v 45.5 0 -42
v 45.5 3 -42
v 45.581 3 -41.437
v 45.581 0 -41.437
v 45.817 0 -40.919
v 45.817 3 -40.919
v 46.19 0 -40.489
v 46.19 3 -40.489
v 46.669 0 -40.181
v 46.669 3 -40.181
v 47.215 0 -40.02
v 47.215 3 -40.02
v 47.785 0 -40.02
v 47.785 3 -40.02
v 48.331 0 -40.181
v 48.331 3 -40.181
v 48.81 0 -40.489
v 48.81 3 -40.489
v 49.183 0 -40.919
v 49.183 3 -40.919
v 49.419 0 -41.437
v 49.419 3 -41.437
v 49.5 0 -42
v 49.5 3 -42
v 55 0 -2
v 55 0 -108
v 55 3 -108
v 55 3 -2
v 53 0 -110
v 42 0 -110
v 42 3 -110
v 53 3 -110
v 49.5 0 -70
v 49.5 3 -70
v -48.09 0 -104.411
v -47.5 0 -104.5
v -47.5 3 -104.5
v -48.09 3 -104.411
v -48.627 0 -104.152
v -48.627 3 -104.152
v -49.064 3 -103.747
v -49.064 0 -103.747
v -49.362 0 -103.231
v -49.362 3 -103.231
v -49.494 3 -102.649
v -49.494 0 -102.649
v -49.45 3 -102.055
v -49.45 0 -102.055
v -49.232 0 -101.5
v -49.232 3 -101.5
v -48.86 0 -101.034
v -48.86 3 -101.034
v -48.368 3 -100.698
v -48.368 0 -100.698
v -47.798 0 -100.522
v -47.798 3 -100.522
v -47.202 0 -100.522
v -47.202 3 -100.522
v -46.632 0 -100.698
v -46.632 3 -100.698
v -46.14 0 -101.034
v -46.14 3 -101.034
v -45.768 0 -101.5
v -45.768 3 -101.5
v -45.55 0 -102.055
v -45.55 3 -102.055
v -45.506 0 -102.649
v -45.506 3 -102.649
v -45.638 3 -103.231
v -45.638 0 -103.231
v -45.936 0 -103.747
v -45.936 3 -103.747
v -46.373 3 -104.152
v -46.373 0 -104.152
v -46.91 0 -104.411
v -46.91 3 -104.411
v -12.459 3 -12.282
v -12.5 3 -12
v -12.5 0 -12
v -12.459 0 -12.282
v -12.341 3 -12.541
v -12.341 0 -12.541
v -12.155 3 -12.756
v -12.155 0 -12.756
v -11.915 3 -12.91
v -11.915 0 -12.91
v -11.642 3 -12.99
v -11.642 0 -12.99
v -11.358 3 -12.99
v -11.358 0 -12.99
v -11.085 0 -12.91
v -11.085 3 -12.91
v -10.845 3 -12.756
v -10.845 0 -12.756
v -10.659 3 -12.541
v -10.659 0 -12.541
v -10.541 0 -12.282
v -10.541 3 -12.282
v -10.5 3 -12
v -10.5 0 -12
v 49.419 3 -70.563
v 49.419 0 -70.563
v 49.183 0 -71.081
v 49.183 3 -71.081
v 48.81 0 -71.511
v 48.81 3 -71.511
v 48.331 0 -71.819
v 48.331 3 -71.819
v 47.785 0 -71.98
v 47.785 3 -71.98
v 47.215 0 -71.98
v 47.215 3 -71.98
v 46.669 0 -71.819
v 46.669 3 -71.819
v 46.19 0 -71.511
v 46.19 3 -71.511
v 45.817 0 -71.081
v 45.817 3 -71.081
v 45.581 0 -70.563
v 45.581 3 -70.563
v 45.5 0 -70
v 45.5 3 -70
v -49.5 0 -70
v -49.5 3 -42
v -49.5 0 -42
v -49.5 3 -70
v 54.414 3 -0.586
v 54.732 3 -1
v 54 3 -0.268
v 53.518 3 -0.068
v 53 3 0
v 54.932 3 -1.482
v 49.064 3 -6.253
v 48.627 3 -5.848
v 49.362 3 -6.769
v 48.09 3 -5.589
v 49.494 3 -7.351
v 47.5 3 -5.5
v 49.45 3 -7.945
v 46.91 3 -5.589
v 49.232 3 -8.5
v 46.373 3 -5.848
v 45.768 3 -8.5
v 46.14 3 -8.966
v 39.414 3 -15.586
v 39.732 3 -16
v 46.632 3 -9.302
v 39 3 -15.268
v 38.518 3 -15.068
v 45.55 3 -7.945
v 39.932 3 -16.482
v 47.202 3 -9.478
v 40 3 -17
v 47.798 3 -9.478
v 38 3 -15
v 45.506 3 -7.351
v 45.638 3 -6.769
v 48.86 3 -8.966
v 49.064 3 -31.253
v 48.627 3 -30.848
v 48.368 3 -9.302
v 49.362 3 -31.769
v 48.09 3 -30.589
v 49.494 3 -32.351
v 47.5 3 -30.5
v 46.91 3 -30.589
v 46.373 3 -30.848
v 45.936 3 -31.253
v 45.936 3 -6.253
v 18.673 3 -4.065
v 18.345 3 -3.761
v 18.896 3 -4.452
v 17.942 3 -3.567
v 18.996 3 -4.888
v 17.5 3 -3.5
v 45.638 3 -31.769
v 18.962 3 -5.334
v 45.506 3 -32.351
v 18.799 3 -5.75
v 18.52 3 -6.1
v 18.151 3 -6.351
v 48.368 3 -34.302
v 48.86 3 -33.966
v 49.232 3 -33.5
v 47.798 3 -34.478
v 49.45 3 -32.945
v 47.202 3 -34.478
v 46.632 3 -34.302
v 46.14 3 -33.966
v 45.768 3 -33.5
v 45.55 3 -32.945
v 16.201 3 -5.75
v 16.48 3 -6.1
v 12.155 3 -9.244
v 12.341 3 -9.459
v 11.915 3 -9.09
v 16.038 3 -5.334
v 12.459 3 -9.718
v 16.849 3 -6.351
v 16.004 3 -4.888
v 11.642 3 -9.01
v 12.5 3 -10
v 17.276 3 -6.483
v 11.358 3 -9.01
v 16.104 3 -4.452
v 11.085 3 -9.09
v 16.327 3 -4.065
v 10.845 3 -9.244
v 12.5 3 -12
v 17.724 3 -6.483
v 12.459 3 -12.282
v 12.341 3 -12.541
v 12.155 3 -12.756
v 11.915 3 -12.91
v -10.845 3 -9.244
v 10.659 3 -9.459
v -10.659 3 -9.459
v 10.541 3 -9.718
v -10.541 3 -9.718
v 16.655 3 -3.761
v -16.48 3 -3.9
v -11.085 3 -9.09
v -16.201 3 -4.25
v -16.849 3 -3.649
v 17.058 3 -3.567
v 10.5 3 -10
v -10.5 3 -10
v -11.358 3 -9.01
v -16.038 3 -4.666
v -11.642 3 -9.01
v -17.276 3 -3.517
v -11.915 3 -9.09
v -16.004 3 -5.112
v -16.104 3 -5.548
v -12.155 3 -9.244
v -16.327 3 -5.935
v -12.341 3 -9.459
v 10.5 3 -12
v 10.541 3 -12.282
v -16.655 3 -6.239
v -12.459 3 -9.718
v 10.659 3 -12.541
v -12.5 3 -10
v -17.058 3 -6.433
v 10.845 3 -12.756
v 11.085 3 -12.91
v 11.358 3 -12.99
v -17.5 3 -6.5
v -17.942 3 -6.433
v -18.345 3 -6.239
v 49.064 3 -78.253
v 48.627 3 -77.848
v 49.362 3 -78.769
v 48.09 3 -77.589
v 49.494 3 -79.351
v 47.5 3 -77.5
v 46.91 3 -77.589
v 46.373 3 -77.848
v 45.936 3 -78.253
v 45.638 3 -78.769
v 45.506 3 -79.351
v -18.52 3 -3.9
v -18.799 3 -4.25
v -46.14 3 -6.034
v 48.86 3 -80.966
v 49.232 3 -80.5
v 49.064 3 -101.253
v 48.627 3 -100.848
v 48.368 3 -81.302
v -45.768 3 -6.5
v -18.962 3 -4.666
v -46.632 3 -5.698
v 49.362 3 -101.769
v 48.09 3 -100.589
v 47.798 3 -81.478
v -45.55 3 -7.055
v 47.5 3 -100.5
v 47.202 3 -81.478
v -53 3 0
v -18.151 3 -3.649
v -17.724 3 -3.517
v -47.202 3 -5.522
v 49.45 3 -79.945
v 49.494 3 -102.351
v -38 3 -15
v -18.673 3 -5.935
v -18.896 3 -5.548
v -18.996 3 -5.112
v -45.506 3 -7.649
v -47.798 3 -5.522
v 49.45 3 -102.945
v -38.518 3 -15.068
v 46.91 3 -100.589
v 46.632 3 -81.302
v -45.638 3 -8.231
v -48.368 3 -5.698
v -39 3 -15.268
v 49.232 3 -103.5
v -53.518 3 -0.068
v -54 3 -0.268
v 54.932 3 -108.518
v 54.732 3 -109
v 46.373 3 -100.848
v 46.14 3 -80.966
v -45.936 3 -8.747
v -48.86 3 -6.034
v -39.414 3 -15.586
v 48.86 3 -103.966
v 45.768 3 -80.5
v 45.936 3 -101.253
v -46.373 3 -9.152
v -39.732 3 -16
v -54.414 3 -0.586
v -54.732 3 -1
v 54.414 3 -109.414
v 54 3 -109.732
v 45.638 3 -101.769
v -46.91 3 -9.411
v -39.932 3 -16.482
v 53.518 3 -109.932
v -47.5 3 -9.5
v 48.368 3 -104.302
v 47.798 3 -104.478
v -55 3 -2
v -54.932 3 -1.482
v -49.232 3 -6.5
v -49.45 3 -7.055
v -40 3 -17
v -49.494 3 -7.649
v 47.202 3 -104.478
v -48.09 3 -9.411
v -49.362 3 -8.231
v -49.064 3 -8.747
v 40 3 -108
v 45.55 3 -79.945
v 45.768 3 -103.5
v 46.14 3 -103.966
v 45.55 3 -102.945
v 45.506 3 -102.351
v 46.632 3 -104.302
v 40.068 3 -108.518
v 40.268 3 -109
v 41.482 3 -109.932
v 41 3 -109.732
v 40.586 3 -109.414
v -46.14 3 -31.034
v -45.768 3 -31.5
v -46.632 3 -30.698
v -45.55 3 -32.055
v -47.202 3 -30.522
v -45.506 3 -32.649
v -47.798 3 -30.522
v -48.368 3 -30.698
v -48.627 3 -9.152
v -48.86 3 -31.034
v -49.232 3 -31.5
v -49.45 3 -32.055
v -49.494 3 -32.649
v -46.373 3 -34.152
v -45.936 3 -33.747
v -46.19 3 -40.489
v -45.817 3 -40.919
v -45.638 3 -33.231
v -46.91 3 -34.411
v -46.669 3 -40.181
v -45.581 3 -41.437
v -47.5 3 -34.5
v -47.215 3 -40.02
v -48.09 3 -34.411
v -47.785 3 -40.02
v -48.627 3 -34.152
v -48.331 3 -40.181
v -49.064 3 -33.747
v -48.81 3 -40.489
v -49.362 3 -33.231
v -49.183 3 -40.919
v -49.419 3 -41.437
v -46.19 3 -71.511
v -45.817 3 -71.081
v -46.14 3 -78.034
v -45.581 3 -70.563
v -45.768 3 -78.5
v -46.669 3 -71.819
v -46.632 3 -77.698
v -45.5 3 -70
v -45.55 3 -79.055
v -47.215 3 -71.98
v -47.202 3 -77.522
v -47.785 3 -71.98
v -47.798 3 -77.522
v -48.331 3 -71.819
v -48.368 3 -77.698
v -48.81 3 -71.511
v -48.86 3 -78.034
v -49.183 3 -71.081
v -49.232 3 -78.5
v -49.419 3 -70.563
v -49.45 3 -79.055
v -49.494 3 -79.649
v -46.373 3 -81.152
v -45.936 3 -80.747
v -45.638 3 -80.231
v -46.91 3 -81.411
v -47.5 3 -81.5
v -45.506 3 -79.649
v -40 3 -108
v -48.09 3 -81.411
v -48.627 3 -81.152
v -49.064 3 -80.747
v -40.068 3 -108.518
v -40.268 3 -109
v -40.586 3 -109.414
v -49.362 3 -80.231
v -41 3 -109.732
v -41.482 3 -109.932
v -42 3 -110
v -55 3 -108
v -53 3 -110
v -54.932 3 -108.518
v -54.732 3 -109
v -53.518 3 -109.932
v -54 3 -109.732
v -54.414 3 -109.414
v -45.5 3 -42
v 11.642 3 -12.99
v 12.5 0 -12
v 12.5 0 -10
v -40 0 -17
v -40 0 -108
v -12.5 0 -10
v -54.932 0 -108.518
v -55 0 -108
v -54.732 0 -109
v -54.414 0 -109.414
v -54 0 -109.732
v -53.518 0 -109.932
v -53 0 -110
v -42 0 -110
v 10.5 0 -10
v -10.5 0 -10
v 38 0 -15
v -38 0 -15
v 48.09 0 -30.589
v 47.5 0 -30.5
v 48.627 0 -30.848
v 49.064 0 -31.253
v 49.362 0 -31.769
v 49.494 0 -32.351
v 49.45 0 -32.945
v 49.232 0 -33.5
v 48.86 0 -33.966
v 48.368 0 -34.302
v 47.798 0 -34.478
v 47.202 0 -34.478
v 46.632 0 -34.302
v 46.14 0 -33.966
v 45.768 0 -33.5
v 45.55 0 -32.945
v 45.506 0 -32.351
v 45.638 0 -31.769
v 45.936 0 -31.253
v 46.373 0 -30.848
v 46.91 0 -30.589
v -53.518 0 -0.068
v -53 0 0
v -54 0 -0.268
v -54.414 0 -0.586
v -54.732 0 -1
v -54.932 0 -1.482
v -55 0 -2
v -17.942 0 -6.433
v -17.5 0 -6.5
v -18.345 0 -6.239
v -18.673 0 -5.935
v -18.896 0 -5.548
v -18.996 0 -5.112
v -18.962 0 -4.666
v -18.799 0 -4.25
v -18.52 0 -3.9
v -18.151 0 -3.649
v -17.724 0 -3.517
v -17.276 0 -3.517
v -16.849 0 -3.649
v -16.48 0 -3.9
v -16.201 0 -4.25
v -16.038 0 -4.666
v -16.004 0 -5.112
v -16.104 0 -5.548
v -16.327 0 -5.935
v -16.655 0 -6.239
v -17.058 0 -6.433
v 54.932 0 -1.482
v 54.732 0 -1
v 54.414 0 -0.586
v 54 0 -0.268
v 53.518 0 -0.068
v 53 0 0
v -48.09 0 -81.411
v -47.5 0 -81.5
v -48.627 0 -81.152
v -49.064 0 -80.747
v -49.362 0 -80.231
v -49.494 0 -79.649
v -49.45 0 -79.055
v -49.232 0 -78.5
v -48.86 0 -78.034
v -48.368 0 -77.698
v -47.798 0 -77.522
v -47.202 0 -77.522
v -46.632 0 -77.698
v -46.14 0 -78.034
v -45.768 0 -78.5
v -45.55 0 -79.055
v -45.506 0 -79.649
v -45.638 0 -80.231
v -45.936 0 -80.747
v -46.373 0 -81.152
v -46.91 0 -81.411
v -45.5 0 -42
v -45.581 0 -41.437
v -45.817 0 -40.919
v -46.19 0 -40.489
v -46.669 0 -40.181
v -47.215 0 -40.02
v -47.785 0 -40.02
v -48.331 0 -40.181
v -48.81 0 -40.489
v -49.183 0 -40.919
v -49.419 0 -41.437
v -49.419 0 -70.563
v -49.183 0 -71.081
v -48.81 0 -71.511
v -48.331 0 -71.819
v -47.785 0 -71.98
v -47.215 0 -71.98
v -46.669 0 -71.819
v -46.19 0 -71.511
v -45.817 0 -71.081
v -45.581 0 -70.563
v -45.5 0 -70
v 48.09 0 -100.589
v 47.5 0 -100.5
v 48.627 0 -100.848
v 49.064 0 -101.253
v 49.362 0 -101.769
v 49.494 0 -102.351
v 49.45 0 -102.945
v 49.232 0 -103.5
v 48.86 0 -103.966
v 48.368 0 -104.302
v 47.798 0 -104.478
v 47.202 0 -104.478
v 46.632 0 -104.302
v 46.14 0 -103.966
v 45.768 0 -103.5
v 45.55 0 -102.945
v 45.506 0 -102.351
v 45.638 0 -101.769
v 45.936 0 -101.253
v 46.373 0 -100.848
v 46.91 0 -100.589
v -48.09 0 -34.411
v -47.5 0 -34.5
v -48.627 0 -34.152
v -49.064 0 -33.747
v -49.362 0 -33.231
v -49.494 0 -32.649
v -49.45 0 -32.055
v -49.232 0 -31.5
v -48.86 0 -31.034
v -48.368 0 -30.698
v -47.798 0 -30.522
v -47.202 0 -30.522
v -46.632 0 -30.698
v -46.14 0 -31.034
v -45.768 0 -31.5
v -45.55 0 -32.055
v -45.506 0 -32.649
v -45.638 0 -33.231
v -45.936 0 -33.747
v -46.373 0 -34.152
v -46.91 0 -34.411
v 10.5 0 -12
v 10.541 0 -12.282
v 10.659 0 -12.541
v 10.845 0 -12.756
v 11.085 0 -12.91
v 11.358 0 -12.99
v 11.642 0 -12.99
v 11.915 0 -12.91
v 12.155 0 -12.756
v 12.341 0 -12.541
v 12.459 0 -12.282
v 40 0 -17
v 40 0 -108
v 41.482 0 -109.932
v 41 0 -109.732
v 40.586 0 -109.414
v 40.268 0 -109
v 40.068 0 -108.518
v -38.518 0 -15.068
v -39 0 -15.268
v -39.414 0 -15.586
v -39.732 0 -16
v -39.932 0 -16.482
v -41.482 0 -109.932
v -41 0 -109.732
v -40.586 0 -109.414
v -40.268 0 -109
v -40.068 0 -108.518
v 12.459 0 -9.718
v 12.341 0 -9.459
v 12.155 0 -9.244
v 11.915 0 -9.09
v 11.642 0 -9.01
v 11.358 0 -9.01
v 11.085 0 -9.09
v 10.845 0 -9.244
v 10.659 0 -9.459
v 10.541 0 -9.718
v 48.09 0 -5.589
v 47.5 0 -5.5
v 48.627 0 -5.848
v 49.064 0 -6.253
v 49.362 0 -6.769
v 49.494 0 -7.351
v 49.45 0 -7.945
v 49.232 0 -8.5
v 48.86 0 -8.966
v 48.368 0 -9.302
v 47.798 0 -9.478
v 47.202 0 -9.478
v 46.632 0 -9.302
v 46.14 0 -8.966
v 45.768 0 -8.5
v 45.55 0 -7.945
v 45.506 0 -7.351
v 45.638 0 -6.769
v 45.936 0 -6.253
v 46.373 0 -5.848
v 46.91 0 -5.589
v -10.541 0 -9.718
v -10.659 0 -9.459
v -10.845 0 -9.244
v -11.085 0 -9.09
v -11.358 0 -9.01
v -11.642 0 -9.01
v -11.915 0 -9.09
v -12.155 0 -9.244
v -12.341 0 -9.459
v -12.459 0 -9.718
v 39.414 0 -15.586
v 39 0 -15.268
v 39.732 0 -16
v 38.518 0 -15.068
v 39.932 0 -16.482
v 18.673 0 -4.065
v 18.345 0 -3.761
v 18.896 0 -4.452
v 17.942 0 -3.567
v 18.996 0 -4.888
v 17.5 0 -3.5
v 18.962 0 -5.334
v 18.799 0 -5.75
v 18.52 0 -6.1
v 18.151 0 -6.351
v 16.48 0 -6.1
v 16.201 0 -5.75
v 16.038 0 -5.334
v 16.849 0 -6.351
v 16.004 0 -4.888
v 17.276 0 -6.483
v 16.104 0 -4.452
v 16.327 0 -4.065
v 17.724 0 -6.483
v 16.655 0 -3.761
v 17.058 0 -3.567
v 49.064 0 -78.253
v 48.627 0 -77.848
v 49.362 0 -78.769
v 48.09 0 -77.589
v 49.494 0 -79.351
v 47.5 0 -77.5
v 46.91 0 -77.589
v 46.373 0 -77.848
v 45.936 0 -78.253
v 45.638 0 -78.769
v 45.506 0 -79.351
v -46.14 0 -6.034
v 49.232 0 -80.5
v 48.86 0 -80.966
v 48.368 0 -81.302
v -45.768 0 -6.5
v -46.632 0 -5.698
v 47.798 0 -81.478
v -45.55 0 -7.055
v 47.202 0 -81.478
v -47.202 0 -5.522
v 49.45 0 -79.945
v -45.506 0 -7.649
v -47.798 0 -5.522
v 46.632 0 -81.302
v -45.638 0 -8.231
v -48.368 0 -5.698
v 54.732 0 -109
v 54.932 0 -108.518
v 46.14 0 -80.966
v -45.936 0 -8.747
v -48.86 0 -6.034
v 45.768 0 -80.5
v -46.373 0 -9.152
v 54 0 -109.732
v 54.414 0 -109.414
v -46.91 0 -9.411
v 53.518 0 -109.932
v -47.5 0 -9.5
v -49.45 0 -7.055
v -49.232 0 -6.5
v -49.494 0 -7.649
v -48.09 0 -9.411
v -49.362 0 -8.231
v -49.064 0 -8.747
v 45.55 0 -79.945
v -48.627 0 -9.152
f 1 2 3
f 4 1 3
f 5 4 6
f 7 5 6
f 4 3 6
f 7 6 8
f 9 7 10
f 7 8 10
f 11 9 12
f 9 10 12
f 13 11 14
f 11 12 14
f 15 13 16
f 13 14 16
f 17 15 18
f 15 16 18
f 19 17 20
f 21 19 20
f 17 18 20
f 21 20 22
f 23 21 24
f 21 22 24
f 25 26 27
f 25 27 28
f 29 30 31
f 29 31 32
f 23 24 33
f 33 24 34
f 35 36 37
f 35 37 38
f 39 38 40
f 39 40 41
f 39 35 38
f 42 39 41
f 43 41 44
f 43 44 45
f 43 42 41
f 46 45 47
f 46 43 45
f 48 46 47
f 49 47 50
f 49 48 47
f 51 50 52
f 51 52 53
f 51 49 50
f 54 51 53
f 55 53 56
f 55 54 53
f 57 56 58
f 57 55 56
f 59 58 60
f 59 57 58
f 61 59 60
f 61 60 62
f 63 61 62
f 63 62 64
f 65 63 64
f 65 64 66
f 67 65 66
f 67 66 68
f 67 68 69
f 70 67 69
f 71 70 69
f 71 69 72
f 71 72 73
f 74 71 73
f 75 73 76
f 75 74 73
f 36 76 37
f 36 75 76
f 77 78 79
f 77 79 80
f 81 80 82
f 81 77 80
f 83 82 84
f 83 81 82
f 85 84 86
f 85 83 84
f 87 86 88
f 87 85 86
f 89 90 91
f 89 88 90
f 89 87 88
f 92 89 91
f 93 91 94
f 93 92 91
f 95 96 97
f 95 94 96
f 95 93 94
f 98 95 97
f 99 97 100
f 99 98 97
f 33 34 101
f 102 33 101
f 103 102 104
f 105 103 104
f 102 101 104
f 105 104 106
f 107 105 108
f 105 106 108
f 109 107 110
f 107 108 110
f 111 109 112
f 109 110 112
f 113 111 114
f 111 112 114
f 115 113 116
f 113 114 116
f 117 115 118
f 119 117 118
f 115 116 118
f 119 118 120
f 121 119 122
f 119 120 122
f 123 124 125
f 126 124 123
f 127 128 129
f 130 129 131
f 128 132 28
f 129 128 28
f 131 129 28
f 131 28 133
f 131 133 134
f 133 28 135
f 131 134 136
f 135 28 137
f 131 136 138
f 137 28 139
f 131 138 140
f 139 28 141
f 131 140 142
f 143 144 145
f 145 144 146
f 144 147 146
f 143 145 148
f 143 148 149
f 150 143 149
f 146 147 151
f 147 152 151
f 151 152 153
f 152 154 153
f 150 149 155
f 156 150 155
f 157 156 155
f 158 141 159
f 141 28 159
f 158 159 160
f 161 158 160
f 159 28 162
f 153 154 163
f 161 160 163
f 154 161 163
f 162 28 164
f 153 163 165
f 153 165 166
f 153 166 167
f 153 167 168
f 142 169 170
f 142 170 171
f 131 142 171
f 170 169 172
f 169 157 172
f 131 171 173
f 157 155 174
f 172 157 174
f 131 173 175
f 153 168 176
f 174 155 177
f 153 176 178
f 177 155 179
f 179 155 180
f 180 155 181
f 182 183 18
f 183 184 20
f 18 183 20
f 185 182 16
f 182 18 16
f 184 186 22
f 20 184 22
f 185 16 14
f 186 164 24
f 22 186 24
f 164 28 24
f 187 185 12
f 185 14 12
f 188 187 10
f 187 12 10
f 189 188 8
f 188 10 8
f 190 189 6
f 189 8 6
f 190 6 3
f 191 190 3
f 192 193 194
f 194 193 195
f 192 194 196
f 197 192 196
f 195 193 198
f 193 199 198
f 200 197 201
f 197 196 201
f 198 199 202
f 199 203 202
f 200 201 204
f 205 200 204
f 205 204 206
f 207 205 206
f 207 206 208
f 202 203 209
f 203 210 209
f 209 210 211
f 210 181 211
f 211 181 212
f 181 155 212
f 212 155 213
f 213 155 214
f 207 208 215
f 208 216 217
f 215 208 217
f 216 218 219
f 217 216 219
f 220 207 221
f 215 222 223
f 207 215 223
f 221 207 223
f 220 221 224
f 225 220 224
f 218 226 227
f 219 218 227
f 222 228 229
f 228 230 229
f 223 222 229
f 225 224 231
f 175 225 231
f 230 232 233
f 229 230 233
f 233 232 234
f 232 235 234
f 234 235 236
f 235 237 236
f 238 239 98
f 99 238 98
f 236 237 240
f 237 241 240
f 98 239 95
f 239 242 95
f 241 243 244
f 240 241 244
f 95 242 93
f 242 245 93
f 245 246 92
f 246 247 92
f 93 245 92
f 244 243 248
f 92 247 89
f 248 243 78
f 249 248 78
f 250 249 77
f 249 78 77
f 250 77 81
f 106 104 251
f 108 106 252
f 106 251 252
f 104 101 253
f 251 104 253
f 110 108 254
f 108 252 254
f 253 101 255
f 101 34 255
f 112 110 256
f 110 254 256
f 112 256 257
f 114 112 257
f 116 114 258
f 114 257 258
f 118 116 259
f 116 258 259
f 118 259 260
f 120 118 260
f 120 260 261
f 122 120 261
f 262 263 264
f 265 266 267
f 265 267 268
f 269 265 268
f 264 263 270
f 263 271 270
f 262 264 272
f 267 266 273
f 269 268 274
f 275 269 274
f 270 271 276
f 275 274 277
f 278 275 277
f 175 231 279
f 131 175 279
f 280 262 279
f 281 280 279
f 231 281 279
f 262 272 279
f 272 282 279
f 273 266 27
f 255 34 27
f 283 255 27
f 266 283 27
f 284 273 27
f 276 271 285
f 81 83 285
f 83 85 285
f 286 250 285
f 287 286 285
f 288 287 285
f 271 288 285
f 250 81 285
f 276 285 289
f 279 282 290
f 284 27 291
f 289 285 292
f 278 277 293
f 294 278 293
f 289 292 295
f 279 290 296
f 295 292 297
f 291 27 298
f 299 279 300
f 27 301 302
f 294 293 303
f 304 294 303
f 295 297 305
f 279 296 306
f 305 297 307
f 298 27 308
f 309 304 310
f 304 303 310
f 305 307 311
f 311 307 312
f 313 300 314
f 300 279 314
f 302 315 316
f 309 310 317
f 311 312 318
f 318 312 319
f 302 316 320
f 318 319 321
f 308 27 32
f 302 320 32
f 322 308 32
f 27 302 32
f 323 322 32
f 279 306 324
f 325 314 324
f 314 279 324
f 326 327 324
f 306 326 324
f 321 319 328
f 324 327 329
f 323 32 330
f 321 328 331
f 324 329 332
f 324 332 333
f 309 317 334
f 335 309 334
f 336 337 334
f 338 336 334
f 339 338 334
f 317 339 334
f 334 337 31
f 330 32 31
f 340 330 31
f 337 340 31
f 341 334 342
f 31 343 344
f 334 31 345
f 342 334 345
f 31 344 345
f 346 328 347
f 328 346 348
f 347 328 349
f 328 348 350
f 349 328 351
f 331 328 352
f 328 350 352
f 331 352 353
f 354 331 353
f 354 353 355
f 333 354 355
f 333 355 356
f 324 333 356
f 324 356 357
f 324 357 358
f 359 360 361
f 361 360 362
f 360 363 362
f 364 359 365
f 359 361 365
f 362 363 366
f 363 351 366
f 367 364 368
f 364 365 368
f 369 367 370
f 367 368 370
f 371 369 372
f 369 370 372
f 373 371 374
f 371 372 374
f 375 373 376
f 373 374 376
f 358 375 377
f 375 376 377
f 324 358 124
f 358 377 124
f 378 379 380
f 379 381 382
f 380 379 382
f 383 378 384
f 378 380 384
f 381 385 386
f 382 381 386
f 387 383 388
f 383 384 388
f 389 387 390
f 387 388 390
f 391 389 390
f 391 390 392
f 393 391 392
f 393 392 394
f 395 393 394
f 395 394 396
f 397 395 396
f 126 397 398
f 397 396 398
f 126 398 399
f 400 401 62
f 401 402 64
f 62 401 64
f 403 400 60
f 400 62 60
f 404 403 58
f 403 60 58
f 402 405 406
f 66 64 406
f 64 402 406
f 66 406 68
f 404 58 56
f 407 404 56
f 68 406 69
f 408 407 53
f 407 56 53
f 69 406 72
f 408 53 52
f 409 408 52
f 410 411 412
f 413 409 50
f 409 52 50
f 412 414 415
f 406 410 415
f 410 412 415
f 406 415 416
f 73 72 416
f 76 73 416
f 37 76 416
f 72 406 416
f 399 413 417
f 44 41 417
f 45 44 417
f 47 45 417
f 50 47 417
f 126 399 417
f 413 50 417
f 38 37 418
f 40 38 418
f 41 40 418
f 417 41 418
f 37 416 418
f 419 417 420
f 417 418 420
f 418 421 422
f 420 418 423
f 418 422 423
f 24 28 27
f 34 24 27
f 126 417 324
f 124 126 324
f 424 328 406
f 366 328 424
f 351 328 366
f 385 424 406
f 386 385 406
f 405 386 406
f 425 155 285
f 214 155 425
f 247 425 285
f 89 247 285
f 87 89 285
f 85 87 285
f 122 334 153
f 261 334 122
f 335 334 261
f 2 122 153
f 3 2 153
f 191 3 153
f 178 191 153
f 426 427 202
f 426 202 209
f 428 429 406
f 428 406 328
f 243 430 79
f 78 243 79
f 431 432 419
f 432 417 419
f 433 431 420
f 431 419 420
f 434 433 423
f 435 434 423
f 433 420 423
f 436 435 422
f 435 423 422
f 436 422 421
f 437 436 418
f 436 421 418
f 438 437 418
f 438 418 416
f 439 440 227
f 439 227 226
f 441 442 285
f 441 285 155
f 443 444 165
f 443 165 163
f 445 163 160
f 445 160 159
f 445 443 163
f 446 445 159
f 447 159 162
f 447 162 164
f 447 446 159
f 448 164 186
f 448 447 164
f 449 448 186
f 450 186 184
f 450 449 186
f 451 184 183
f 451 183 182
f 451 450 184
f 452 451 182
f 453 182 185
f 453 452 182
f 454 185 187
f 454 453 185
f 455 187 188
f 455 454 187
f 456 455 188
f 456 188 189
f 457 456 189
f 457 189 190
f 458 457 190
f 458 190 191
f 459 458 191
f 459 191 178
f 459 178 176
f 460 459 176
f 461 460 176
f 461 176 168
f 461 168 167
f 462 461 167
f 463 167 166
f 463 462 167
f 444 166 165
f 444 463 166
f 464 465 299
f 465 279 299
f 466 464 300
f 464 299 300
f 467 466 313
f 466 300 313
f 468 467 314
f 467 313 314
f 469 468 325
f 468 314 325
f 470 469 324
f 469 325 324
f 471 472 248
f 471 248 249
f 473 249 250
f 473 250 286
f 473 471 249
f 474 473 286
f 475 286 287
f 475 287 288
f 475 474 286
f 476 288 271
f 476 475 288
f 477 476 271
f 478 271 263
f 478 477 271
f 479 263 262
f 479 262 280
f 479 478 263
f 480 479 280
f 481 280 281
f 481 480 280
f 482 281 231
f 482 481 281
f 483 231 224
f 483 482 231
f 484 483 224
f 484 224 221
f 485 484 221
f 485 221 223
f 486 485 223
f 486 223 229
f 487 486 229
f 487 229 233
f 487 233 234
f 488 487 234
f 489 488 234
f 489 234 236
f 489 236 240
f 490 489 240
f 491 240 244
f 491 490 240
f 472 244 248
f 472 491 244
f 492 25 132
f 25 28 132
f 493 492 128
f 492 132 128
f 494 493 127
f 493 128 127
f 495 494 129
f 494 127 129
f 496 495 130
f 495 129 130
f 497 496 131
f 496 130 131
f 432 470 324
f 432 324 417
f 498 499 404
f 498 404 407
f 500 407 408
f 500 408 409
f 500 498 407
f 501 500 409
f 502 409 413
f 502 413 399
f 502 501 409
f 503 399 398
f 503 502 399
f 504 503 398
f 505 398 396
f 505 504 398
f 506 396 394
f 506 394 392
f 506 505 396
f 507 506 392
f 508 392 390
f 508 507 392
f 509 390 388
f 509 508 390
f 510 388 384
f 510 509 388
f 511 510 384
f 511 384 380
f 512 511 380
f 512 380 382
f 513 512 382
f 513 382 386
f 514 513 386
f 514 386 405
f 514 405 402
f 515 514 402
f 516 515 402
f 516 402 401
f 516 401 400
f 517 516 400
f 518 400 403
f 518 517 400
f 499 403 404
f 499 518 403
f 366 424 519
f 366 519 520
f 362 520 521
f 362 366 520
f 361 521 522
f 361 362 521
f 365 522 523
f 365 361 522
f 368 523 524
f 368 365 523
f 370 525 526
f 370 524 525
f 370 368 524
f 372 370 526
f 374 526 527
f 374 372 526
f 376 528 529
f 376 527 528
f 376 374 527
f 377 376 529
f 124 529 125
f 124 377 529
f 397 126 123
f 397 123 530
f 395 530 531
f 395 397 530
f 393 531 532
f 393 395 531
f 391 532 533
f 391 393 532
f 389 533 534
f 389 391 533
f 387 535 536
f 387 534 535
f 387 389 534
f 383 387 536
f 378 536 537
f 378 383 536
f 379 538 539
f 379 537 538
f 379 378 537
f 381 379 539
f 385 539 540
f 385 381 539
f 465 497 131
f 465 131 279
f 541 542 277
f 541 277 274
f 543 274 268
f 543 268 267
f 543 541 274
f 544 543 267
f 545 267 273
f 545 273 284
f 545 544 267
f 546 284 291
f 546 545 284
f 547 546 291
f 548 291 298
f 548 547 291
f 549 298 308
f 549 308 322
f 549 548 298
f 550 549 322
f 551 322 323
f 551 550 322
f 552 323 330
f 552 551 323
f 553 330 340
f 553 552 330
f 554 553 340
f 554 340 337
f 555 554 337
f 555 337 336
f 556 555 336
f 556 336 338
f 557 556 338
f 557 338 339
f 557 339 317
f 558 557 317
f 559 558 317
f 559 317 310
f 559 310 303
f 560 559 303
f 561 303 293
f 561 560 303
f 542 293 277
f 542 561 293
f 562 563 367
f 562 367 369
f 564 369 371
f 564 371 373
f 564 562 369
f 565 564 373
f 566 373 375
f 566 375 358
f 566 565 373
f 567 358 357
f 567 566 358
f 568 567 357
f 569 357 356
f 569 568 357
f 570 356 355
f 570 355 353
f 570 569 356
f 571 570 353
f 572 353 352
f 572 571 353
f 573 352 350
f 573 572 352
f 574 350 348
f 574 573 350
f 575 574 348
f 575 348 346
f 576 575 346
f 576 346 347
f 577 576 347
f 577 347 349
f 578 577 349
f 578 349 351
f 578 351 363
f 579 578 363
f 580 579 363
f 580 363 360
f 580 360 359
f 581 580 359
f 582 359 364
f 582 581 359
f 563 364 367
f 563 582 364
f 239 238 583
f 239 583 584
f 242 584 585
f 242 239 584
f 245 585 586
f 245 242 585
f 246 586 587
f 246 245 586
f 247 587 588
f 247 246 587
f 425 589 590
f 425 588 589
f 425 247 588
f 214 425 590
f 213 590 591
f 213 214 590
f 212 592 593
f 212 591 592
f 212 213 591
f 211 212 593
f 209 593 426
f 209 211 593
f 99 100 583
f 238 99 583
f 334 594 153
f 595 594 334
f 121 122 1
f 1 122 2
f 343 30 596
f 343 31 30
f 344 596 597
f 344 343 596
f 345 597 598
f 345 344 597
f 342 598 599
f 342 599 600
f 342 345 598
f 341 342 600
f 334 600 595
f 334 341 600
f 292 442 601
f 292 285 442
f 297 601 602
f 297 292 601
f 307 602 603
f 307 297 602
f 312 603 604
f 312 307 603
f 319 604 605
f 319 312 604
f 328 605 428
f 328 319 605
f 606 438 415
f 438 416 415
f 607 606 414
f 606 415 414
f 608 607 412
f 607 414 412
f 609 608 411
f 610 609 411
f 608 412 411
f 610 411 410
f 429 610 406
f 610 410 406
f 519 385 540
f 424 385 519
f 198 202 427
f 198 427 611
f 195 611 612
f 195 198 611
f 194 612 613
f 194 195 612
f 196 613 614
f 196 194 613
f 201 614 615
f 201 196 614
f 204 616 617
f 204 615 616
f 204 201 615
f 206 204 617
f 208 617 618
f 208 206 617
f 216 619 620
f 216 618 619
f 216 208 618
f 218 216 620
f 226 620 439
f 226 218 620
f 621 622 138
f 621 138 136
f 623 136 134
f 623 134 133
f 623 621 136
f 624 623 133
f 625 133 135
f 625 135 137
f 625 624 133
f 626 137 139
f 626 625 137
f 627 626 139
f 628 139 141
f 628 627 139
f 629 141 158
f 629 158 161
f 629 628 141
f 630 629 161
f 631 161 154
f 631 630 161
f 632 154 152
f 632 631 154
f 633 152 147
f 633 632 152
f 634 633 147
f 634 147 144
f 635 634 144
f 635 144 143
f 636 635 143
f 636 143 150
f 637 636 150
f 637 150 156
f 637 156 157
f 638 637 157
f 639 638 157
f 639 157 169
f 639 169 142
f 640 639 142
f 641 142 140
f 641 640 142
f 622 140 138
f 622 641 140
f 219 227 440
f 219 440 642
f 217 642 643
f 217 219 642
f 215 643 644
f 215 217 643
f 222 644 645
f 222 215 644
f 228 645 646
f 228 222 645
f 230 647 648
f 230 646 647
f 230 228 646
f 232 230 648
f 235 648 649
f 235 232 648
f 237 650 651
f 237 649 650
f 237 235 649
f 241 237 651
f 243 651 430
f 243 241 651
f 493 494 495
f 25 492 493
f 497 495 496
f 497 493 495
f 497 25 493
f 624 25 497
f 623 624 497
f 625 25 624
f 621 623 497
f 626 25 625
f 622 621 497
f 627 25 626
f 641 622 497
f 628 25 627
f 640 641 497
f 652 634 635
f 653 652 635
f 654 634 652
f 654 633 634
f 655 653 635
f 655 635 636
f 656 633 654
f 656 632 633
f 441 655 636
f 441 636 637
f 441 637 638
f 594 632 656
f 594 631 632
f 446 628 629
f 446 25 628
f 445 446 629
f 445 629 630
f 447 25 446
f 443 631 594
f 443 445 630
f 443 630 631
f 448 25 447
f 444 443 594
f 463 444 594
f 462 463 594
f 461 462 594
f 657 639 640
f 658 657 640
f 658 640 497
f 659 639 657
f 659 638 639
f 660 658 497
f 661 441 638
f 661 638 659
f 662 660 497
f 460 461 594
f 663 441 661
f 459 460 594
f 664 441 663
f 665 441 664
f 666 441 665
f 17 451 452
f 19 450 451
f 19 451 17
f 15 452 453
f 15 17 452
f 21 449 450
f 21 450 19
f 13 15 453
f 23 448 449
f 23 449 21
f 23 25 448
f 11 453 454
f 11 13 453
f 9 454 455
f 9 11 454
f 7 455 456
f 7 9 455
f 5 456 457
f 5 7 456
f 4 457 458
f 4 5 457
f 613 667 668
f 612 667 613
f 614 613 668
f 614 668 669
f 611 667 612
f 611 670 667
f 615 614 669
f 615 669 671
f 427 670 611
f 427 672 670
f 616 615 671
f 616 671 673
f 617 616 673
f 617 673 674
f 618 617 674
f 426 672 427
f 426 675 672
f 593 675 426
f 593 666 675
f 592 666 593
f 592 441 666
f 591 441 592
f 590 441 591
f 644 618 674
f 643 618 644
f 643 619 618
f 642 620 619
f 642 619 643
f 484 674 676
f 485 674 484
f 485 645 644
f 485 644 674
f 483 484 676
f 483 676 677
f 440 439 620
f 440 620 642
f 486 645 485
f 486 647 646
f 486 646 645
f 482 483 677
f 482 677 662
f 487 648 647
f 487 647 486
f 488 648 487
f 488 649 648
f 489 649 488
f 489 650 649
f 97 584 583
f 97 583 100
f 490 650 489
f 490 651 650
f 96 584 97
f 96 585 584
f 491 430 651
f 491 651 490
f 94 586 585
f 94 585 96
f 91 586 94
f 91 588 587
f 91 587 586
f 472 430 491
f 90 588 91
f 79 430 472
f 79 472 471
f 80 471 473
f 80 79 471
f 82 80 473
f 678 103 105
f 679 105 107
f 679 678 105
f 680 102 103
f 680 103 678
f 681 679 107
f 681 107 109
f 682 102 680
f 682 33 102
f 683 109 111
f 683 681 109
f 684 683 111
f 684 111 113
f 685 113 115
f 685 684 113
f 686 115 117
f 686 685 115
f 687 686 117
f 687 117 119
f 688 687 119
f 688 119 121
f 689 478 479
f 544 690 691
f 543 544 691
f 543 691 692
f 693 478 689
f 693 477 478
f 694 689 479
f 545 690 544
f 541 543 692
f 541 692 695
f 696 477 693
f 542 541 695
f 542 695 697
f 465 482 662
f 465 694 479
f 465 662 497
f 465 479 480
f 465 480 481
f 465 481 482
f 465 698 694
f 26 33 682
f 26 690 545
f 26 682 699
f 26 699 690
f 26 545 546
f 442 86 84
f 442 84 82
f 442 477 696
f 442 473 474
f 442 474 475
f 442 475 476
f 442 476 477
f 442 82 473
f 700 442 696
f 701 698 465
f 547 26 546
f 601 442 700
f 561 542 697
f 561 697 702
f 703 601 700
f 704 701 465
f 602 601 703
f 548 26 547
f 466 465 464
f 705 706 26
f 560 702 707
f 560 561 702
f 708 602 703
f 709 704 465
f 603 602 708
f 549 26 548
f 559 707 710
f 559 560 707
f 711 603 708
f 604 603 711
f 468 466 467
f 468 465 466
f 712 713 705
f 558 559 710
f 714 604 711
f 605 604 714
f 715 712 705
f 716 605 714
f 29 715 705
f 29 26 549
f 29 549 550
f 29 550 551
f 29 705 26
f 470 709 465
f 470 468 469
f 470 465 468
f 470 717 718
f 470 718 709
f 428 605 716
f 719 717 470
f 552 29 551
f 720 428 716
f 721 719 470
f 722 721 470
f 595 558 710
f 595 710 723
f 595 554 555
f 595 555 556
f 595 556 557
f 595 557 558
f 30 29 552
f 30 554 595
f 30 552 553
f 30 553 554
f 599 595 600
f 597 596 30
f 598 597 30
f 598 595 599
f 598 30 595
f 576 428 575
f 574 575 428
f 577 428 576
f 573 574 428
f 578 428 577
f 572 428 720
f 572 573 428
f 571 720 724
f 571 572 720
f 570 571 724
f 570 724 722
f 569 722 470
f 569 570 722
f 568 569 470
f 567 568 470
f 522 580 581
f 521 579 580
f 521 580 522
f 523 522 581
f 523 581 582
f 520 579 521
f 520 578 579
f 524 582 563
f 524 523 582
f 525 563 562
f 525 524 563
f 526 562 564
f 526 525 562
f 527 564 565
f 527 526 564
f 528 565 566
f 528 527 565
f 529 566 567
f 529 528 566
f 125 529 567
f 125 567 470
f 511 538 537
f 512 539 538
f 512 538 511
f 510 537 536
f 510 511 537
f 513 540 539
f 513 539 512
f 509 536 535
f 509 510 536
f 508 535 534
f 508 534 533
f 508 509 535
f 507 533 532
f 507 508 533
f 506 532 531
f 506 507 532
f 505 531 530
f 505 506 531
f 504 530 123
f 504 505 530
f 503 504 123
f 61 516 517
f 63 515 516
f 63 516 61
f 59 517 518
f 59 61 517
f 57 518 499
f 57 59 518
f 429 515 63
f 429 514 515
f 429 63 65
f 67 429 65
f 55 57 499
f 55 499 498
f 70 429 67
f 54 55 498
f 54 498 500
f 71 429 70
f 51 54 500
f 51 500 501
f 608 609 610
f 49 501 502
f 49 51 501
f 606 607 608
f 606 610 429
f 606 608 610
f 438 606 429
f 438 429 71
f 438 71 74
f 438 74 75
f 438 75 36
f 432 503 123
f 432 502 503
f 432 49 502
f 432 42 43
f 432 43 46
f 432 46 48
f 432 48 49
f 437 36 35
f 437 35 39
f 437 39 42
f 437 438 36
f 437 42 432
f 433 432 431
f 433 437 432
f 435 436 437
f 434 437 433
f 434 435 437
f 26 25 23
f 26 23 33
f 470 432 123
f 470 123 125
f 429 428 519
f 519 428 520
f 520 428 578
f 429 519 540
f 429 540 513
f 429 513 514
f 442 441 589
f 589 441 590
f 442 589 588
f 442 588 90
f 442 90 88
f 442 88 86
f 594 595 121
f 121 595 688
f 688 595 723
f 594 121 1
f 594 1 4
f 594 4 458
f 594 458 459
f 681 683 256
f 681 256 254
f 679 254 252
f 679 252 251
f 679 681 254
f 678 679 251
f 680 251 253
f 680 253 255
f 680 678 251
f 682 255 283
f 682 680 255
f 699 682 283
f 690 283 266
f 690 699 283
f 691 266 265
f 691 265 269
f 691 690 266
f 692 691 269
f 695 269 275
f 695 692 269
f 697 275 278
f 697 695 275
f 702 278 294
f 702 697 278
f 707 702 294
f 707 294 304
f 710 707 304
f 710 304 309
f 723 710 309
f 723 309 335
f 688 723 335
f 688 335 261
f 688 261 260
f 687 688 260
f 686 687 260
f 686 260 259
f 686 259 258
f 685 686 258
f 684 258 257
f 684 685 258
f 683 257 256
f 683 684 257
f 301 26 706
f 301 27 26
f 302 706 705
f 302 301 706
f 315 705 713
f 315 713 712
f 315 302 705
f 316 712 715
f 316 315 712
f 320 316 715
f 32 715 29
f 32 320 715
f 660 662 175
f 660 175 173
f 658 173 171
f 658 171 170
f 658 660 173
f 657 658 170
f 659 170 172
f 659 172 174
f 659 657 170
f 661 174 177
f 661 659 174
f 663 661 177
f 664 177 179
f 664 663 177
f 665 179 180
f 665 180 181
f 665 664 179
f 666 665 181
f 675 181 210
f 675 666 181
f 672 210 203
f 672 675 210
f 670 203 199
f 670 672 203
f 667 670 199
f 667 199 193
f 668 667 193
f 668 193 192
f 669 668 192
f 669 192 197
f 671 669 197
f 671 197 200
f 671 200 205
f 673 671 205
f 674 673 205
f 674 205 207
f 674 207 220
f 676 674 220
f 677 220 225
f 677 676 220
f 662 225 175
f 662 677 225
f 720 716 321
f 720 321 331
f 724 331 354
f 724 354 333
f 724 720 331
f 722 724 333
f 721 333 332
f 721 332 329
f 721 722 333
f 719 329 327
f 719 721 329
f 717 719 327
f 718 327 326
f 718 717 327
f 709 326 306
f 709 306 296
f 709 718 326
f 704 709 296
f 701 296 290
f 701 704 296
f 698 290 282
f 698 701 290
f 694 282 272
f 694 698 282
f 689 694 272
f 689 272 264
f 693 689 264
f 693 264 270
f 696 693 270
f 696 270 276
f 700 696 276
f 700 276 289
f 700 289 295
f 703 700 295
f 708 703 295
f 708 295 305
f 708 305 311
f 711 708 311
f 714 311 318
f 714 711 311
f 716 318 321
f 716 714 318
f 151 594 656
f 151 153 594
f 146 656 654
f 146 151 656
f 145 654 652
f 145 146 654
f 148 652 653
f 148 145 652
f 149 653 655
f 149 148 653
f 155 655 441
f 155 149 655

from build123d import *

# Parameters (mm, degrees)
SKETCH_1_R          = 2
SKETCH_1_R_2        = 1.5
SKETCH_1_W          = 25
SKETCH_1_H          = 2
EXTRUDE_1_DEPTH     = 3
CUT_EXTRUDE_1_DEPTH = 124.020323524
CUT_EXTRUDE_2_DEPTH = 124.020323524
FILLET_1_R          = 2


with BuildPart() as part:
    # 草图1 → 凸台-拉伸1 (new body)
    with BuildSketch(Plane(origin=(0, 0, 0), x_dir=(1, 0, 0), z_dir=(0, 1, 0))):
        Polygon((55, 110), (55, 0), (-55, 0), (-55, 110), (-40, 110), (-40, 15), (40, 15), (40, 110), align=None)
        with Locations(Location((47.5, 32.5, 0), (0, 0, 270))):
            Circle(SKETCH_1_R, mode=Mode.SUBTRACT)
        with Locations(Location((47.5, 7.5, 0), (0, 0, 270))):
            Circle(SKETCH_1_R, mode=Mode.SUBTRACT)
        with Locations(Location((47.5, 79.5, 0), (0, 0, 270))):
            Circle(SKETCH_1_R, mode=Mode.SUBTRACT)
        with Locations(Location((47.5, 102.5, 0), (0, 0, 270))):
            Circle(SKETCH_1_R, mode=Mode.SUBTRACT)
        with Locations(Location((-47.5, 102.5, 0), (0, 0, 90))):
            Circle(SKETCH_1_R, mode=Mode.SUBTRACT)
        with Locations(Location((-47.5, 79.5, 0), (0, 0, 90))):
            Circle(SKETCH_1_R, mode=Mode.SUBTRACT)
        with Locations(Location((-47.5, 7.5, 0), (0, 0, 90))):
            Circle(SKETCH_1_R, mode=Mode.SUBTRACT)
        with Locations(Location((-47.5, 32.5, 0), (0, 0, 90))):
            Circle(SKETCH_1_R, mode=Mode.SUBTRACT)
        with Locations(Location((17.5, 5, 0), (0, 0, 270))):
            Circle(SKETCH_1_R_2, mode=Mode.SUBTRACT)
        with Locations(Location((-17.5, 5, 0), (0, 0, 90))):
            Circle(SKETCH_1_R_2, mode=Mode.SUBTRACT)
        with Locations((0, 11)):
            Rectangle(SKETCH_1_W, SKETCH_1_H, mode=Mode.SUBTRACT)
    extrude(amount=EXTRUDE_1_DEPTH)

    # 草图2 → 切除-拉伸1 (cut, through all)
    with BuildSketch(Plane(origin=(0, 3, 0), x_dir=(1, 0, 0), z_dir=(0, 1, 0))):
        with BuildLine():
            Line((-12.5, 10), (-10.5, 10))
            ThreePointArc((-10.5, 10), (-11.5, 9), (-12.5, 10))
        make_face()
        with BuildLine():
            Line((12.5, 12), (10.5, 12))
            ThreePointArc((10.5, 12), (11.5, 13), (12.5, 12))
        make_face()
        with BuildLine():
            Line((-10.5, 12), (-12.5, 12))
            ThreePointArc((-12.5, 12), (-11.5, 13), (-10.5, 12))
        make_face()
        with BuildLine():
            Line((10.5, 10), (12.5, 10))
            ThreePointArc((12.5, 10), (11.5, 9), (10.5, 10))
        make_face()
    extrude(amount=-CUT_EXTRUDE_1_DEPTH, mode=Mode.SUBTRACT)

    # 草图3 → 切除-拉伸2 (cut, through all)
    with BuildSketch(Plane(origin=(0, 3, 0), x_dir=(1, 0, 0), z_dir=(0, 1, 0))):
        with BuildLine():
            Line((-45.5, 70), (-45.5, 42))
            ThreePointArc((-45.5, 42), (-47.5, 40), (-49.5, 42))
            Line((-49.5, 42), (-49.5, 70))
            ThreePointArc((-49.5, 70), (-47.5, 72), (-45.5, 70))
        make_face()
        with BuildLine():
            Line((45.5, 70), (45.5, 42))
            ThreePointArc((45.5, 42), (47.5, 40), (49.5, 42))
            Line((49.5, 42), (49.5, 70))
            ThreePointArc((49.5, 70), (47.5, 72), (45.5, 70))
        make_face()
    extrude(amount=-CUT_EXTRUDE_2_DEPTH, mode=Mode.SUBTRACT)

    # 圆角1
    fillet_1_edges = [part.edges().sort_by_distance(p)[0] for p in [
        (55, 1.5, -110),
        (55, 1.5, 0),
        (-55, 1.5, 0),
        (-55, 1.5, -110),
        (-40, 1.5, -110),
        (-40, 1.5, -15),
        (40, 1.5, -15),
        (40, 1.5, -110),
    ]]
    fillet(fillet_1_edges, radius=FILLET_1_R)


solid = part.part
